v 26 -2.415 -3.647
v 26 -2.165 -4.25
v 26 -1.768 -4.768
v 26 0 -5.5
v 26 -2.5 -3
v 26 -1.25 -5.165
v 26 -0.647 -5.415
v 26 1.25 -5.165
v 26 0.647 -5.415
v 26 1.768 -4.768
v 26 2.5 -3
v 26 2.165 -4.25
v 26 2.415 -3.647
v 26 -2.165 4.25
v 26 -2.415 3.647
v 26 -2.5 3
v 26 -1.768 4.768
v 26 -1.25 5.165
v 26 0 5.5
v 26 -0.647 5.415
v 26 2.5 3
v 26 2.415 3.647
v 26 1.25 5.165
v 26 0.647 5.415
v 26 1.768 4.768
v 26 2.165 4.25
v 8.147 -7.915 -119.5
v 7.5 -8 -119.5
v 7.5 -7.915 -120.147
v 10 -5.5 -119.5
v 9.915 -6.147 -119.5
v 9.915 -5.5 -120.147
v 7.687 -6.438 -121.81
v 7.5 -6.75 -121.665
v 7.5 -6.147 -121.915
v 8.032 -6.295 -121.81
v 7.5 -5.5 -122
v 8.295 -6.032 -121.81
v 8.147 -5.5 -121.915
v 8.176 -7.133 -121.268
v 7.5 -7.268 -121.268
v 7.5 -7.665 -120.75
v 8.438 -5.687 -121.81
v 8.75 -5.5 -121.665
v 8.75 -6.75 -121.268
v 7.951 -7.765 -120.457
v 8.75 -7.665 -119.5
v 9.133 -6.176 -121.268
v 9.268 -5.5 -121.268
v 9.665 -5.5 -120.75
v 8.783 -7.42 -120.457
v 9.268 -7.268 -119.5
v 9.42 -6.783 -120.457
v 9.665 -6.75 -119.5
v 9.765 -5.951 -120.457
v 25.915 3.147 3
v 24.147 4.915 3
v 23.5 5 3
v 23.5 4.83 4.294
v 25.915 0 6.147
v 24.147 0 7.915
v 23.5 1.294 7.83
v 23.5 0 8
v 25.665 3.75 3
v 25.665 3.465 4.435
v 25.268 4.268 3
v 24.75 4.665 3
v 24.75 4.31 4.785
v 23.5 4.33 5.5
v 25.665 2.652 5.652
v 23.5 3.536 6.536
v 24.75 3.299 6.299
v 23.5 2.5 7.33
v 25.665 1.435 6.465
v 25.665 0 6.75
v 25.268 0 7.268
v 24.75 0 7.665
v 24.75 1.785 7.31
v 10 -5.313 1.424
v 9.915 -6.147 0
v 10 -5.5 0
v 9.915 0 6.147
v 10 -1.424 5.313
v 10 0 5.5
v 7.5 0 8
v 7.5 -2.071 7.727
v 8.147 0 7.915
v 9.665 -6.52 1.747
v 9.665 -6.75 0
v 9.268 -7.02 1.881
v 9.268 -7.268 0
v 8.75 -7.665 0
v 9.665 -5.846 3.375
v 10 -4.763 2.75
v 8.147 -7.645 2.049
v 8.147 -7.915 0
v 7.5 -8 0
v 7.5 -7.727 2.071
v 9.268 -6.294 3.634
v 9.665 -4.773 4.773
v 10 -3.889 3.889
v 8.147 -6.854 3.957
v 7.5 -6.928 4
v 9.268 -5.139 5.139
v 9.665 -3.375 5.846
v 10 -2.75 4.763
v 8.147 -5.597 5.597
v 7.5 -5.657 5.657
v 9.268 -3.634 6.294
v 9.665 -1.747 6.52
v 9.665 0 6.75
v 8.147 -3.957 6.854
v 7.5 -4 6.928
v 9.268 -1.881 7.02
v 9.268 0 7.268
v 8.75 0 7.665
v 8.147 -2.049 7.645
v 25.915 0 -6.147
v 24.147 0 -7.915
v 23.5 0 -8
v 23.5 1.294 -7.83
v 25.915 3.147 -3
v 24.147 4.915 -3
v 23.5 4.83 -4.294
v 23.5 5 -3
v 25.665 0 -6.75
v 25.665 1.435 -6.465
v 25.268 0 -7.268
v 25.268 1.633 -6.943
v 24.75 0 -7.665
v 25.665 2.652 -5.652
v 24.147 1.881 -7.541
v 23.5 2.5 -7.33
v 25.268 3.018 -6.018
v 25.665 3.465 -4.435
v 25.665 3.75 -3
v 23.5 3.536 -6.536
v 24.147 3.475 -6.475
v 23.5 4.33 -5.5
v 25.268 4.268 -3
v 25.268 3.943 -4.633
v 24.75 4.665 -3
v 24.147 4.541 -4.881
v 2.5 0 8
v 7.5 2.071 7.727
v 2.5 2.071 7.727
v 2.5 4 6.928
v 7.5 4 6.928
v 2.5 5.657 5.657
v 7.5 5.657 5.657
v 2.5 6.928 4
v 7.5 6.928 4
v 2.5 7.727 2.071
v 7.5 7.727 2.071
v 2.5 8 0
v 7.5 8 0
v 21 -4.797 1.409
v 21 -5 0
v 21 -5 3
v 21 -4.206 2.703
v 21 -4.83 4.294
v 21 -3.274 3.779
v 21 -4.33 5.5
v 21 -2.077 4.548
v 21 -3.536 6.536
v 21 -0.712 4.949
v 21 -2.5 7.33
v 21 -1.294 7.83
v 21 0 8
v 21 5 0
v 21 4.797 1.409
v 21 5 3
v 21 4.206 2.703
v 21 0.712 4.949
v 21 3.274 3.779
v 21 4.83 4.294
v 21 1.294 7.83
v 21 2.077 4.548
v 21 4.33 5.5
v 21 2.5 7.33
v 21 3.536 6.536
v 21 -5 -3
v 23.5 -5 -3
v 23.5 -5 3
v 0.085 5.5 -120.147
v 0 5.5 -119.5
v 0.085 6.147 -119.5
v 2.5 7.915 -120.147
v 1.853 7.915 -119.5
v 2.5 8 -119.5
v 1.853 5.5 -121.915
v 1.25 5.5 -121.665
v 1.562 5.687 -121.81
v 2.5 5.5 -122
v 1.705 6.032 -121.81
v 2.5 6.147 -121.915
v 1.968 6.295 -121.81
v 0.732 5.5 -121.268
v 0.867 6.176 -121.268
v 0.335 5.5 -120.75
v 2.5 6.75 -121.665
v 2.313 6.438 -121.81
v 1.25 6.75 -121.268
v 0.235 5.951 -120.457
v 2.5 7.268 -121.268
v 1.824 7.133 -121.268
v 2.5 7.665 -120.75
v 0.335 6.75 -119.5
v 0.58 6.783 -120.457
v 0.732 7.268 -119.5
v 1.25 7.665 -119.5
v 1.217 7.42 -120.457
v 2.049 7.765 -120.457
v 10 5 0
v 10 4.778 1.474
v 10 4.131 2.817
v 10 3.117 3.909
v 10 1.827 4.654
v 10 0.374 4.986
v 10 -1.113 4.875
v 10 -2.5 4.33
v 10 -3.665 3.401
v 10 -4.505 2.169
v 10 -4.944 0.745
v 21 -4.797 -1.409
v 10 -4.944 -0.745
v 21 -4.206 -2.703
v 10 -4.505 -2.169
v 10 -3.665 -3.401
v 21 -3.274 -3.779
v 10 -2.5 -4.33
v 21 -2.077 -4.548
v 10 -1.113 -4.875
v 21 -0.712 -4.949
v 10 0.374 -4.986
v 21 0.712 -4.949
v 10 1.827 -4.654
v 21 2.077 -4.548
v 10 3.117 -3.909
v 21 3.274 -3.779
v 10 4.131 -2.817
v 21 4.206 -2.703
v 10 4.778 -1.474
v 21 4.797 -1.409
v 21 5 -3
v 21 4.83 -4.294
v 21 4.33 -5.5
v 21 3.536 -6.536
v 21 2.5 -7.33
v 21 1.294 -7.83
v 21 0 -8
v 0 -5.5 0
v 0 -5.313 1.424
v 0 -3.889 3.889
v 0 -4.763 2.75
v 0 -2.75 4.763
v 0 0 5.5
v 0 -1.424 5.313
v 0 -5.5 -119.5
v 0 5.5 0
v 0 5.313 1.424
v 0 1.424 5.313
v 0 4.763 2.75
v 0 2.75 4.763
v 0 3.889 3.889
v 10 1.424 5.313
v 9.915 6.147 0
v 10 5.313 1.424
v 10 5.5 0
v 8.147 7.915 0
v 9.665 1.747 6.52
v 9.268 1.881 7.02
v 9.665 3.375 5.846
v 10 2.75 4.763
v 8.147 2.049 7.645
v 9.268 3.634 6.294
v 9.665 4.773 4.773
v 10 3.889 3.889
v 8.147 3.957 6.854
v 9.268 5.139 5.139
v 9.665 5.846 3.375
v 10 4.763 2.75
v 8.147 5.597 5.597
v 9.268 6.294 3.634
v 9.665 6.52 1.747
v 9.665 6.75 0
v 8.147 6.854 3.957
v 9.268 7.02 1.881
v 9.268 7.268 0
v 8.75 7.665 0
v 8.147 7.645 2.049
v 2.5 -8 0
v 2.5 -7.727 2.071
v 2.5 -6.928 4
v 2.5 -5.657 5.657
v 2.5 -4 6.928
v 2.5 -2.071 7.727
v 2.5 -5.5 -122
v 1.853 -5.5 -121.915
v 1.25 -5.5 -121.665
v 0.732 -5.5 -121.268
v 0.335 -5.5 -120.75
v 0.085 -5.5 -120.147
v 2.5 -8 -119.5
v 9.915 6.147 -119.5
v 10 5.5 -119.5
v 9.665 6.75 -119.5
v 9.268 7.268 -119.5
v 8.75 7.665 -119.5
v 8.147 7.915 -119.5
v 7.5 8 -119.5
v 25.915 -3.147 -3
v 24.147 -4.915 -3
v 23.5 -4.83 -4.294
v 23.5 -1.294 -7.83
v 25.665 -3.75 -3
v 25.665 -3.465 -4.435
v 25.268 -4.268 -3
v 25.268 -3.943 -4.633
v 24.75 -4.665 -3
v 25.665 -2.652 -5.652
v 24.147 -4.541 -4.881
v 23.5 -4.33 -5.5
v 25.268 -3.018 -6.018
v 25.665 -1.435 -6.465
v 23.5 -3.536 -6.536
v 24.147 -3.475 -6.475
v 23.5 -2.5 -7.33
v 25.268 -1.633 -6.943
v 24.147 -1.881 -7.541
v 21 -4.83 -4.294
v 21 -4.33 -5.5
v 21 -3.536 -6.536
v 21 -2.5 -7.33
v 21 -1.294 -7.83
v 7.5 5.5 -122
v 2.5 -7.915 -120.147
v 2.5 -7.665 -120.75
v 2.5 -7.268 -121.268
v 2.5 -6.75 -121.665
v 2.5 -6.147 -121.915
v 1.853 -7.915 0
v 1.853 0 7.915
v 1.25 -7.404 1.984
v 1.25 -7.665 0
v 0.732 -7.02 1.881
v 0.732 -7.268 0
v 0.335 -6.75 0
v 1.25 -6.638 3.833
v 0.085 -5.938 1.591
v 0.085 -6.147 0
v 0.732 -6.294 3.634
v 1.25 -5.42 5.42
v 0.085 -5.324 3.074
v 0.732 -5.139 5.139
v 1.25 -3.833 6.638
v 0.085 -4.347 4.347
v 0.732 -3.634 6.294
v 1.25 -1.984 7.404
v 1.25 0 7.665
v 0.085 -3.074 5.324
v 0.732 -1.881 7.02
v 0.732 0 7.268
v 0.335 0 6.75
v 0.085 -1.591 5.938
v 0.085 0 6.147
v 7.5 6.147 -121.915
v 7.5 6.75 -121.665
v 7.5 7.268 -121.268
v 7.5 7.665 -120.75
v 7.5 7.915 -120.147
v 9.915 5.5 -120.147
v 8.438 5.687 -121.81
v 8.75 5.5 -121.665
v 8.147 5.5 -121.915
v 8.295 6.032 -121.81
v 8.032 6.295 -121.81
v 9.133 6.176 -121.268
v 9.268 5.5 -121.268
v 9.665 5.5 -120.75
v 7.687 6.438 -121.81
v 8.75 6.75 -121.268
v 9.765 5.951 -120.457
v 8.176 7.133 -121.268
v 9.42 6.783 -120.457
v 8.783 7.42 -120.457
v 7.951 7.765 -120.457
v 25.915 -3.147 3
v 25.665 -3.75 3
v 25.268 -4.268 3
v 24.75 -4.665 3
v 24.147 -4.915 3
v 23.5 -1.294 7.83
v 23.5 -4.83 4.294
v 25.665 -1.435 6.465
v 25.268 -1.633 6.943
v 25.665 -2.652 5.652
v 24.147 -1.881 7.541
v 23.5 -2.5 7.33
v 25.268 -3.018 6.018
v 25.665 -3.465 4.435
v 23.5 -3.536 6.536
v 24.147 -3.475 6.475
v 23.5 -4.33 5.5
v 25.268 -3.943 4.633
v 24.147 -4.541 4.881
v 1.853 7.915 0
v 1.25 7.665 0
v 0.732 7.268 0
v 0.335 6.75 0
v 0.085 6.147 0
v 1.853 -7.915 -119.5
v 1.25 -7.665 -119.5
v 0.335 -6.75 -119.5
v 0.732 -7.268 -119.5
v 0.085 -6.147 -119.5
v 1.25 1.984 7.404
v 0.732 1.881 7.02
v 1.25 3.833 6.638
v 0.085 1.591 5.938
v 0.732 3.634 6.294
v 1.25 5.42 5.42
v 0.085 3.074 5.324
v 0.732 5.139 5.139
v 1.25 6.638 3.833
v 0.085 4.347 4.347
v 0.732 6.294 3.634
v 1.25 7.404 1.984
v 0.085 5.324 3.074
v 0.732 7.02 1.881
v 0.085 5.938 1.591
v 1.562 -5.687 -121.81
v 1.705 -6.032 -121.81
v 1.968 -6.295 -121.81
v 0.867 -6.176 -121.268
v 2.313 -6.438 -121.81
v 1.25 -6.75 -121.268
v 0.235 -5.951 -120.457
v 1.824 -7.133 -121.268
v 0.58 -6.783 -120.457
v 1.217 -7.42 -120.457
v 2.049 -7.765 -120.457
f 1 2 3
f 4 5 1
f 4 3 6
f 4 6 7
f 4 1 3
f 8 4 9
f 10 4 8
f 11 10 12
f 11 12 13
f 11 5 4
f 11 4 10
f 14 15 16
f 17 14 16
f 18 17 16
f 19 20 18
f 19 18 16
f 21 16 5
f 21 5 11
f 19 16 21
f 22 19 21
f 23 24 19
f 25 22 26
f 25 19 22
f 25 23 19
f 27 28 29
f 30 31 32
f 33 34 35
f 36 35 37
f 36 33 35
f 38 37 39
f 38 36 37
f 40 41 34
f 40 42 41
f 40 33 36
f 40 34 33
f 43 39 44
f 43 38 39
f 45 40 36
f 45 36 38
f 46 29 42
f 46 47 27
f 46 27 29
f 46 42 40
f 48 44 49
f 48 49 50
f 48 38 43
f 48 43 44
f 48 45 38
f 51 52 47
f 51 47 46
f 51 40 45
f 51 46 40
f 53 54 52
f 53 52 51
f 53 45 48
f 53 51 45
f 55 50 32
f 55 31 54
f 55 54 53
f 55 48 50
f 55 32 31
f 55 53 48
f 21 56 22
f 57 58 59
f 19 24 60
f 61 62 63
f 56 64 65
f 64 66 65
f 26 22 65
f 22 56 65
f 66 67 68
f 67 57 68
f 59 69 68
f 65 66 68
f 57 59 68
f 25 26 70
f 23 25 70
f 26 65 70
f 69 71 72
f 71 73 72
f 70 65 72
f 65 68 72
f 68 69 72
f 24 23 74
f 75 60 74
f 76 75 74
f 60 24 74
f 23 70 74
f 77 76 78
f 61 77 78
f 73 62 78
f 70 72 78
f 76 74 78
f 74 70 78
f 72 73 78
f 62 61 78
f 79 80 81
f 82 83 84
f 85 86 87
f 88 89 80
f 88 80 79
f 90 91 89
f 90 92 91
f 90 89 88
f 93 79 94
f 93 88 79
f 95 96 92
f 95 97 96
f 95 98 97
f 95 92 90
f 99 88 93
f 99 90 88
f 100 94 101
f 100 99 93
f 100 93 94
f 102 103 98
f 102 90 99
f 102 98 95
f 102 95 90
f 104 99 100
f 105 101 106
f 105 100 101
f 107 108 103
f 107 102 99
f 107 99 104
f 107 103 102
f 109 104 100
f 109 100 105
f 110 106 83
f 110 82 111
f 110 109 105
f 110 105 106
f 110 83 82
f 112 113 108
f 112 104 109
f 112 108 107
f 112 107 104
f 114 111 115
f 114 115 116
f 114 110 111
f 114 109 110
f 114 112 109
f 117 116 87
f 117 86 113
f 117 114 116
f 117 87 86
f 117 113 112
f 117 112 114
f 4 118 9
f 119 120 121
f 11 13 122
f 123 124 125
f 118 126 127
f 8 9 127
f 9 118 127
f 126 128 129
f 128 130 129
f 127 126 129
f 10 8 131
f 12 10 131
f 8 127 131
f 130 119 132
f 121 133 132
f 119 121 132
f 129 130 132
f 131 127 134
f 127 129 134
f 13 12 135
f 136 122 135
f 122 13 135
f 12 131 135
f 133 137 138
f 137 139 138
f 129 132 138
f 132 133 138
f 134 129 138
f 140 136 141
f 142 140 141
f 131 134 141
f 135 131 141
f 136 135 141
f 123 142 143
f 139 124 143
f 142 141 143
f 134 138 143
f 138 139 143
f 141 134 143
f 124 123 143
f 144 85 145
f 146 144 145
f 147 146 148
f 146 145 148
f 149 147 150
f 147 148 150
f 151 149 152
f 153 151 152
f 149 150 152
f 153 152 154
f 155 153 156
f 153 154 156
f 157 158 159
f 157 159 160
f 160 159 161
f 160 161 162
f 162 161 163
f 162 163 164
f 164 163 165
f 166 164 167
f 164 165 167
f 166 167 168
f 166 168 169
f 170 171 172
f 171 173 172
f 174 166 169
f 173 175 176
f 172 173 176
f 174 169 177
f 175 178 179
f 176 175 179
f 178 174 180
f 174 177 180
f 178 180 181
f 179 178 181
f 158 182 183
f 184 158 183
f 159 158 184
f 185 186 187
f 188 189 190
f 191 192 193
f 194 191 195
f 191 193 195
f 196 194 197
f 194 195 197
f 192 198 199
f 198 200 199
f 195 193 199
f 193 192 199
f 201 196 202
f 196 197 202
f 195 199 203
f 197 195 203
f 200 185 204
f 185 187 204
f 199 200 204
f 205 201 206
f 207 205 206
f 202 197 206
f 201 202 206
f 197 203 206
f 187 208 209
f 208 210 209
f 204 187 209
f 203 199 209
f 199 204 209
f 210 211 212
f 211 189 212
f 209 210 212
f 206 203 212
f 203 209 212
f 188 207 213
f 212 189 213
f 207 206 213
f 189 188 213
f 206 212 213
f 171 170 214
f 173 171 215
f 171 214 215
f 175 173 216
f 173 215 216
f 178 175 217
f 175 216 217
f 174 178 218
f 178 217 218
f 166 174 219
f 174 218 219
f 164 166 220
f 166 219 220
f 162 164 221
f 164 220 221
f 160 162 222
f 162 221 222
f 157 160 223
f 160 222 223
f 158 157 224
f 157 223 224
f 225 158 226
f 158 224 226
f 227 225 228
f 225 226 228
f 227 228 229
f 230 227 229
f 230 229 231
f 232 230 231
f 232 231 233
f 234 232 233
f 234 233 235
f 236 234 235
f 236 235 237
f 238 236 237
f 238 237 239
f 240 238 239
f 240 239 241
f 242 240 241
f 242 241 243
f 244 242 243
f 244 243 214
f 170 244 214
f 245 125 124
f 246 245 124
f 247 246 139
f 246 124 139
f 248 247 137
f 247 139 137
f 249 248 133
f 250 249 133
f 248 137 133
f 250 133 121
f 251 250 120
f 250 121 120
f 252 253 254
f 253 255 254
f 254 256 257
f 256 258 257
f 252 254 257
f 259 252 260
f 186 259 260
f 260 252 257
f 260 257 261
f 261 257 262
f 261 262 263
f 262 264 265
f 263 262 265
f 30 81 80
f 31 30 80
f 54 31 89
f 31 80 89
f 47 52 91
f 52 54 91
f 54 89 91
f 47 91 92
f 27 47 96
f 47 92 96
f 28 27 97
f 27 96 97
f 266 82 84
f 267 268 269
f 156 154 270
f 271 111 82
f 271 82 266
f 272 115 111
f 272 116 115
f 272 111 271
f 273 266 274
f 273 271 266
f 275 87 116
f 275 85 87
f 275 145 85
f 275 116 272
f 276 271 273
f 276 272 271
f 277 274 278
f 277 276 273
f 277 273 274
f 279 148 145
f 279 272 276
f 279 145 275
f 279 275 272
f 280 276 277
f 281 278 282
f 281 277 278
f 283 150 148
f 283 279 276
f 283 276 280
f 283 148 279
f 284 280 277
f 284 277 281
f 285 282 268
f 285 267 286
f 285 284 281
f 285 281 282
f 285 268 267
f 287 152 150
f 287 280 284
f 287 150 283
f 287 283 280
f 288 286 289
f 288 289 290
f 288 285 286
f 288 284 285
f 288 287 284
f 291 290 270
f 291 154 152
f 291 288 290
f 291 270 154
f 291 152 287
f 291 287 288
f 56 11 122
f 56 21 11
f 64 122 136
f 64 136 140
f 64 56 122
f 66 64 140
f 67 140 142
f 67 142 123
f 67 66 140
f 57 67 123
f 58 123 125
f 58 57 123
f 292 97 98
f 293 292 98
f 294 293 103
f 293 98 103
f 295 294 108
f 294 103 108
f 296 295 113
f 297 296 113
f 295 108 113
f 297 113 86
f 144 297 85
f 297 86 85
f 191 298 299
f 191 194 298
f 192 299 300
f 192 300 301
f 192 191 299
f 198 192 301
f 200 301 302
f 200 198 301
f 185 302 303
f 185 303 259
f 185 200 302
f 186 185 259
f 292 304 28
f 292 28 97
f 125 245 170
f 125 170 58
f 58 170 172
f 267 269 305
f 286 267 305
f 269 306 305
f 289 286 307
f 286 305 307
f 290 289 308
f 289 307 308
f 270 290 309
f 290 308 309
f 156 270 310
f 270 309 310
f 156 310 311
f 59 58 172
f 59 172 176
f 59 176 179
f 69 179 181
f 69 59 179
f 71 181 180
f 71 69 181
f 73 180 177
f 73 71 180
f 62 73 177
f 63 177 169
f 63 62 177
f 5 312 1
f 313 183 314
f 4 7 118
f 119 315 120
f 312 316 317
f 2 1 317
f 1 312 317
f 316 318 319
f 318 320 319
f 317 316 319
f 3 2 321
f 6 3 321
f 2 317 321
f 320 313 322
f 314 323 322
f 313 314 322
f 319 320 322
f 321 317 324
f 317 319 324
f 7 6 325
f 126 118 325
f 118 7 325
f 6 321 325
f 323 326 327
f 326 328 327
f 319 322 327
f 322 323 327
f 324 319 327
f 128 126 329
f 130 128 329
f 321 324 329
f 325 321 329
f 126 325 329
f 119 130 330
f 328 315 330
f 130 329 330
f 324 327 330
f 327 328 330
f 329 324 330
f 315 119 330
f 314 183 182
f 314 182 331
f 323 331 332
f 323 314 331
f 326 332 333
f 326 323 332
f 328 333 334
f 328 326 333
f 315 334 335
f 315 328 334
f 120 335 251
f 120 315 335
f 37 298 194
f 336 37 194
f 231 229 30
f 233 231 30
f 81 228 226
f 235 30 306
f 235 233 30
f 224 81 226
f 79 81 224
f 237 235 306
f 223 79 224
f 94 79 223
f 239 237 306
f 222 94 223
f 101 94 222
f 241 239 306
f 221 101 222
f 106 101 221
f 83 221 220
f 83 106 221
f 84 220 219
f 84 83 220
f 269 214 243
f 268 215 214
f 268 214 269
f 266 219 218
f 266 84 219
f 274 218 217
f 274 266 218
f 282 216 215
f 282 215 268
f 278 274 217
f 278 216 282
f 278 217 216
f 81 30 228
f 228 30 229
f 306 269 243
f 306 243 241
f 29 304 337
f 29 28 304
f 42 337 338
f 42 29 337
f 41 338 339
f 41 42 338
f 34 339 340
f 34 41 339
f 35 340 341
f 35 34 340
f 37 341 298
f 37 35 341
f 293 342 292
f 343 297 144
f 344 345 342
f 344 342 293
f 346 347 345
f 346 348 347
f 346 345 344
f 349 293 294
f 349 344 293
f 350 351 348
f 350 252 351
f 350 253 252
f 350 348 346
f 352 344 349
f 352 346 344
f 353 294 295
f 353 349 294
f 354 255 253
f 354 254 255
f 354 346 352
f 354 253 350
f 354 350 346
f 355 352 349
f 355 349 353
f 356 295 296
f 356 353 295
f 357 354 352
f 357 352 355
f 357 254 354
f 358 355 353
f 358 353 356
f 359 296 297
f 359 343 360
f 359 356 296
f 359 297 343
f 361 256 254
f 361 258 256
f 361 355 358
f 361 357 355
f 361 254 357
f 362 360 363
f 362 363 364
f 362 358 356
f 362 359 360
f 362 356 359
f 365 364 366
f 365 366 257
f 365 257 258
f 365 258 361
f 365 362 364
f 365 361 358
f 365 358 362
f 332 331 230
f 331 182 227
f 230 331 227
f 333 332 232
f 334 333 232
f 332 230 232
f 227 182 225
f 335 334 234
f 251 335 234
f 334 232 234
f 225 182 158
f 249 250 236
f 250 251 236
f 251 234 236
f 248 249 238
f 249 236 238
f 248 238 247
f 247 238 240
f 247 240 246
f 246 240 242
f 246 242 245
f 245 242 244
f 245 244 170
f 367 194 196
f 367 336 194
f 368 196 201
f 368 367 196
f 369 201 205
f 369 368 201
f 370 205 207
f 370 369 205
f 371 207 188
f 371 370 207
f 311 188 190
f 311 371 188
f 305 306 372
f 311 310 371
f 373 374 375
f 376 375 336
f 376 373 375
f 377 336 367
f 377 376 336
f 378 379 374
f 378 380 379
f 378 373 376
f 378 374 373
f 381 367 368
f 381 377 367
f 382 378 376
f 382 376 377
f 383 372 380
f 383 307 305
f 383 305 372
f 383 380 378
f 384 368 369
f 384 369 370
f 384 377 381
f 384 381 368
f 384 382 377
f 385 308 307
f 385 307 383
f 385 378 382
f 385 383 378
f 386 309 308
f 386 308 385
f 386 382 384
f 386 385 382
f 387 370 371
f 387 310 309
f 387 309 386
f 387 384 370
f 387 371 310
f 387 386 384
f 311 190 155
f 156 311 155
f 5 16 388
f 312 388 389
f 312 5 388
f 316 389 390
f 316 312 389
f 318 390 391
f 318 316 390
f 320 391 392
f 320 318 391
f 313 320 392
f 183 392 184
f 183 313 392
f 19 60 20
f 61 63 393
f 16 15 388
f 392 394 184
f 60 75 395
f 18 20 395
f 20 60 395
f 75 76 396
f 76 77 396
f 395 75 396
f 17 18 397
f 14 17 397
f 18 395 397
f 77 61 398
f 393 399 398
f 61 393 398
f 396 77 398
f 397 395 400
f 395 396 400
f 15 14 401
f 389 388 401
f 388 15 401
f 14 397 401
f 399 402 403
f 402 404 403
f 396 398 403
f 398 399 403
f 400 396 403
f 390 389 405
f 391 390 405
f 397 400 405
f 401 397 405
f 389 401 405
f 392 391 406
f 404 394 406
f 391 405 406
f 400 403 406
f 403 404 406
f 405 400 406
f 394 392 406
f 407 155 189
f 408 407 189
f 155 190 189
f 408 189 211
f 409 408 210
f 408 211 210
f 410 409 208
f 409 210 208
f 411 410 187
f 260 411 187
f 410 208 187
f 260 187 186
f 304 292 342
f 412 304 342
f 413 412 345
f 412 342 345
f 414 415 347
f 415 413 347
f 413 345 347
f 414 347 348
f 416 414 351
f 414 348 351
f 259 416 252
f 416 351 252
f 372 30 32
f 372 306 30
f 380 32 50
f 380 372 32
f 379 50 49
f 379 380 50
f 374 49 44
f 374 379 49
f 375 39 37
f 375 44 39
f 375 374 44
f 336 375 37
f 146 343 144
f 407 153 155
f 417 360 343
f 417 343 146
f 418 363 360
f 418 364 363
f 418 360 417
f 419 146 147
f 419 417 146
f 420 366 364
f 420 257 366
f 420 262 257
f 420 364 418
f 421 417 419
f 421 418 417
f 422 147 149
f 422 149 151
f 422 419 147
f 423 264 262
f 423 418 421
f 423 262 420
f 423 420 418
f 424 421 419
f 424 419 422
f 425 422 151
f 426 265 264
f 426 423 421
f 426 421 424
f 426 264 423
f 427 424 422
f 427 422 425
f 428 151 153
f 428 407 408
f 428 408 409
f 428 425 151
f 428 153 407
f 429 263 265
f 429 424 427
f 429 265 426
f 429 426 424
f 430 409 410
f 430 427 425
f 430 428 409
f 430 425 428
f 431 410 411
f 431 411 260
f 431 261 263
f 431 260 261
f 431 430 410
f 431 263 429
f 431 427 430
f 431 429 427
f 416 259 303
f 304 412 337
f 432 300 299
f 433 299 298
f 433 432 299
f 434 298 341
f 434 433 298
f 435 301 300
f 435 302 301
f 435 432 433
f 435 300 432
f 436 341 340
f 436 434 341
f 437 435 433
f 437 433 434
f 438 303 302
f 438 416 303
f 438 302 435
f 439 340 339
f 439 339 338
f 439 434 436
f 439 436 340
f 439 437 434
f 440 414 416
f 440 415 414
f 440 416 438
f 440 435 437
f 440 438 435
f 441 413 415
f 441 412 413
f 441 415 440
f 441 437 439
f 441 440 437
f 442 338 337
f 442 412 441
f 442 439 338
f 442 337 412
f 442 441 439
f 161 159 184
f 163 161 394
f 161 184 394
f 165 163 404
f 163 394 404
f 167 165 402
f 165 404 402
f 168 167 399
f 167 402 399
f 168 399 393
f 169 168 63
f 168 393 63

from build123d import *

# Parameters (mm, degrees)
F0_W     = 16
F0_H     = 130
F1_DEPTH = 10
F2_R     = 5
F3_DEPTH = 11
F4_W     = 10
F4_H     = 16
F5_DEPTH = 5
F6_R     = 7.99999
F7_R     = 4.99999
F8_R     = 2.5


# Not quite as in the source:
# - a fillet or chamfer is up to 0.001 mm smaller than in the source, because OpenCascade refuses the exact size


with BuildPart() as f1:
    # F0 (on Right) → F1 (new body)
    with BuildSketch(Plane.YZ):
        with Locations((0, -57)):
            Rectangle(F0_W, F0_H)
    extrude(amount=F1_DEPTH)

    # F2 (on face) → F3 (join)
    with BuildSketch(Plane.YZ.offset(10)):
        Circle(F2_R)
    extrude(amount=F3_DEPTH)

    # F4 (on face) → F5 (join)
    with BuildSketch(Plane.YZ.offset(21)):
        Rectangle(F4_W, F4_H)
    extrude(amount=F5_DEPTH)

    # F6 (radius 8 in the source; OpenCascade refuses exactly that, so slightly less here)
    f6_edges = [f1.edges().sort_by_distance(p)[0] for p in [
        (5, -8, 8),
        (5, 8, 8),
    ]]
    fillet(f6_edges, radius=F6_R)

    # F7 (radius 5 in the source; OpenCascade refuses exactly that, so slightly less here)
    f7_edges = [f1.edges().sort_by_distance(p)[0] for p in [
        (23.5, -5, 8),
        (23.5, 5, 8),
        (23.5, -5, -8),
        (23.5, 5, -8),
    ]]
    fillet(f7_edges, radius=F7_R)

    # F8
    f8_edges = [f1.edges().sort_by_distance(p)[0] for p in [
        (26, 3.535537, 6.535537),
        (10, -5.656857, 5.656857),
        (0, -5.656857, 5.656857),
        (0, 0, -122),
        (5, -8, -122),
        (10, 0, -122),
        (5, 8, -122),
    ]]
    fillet(f8_edges, radius=F8_R)


solid = f1.part
